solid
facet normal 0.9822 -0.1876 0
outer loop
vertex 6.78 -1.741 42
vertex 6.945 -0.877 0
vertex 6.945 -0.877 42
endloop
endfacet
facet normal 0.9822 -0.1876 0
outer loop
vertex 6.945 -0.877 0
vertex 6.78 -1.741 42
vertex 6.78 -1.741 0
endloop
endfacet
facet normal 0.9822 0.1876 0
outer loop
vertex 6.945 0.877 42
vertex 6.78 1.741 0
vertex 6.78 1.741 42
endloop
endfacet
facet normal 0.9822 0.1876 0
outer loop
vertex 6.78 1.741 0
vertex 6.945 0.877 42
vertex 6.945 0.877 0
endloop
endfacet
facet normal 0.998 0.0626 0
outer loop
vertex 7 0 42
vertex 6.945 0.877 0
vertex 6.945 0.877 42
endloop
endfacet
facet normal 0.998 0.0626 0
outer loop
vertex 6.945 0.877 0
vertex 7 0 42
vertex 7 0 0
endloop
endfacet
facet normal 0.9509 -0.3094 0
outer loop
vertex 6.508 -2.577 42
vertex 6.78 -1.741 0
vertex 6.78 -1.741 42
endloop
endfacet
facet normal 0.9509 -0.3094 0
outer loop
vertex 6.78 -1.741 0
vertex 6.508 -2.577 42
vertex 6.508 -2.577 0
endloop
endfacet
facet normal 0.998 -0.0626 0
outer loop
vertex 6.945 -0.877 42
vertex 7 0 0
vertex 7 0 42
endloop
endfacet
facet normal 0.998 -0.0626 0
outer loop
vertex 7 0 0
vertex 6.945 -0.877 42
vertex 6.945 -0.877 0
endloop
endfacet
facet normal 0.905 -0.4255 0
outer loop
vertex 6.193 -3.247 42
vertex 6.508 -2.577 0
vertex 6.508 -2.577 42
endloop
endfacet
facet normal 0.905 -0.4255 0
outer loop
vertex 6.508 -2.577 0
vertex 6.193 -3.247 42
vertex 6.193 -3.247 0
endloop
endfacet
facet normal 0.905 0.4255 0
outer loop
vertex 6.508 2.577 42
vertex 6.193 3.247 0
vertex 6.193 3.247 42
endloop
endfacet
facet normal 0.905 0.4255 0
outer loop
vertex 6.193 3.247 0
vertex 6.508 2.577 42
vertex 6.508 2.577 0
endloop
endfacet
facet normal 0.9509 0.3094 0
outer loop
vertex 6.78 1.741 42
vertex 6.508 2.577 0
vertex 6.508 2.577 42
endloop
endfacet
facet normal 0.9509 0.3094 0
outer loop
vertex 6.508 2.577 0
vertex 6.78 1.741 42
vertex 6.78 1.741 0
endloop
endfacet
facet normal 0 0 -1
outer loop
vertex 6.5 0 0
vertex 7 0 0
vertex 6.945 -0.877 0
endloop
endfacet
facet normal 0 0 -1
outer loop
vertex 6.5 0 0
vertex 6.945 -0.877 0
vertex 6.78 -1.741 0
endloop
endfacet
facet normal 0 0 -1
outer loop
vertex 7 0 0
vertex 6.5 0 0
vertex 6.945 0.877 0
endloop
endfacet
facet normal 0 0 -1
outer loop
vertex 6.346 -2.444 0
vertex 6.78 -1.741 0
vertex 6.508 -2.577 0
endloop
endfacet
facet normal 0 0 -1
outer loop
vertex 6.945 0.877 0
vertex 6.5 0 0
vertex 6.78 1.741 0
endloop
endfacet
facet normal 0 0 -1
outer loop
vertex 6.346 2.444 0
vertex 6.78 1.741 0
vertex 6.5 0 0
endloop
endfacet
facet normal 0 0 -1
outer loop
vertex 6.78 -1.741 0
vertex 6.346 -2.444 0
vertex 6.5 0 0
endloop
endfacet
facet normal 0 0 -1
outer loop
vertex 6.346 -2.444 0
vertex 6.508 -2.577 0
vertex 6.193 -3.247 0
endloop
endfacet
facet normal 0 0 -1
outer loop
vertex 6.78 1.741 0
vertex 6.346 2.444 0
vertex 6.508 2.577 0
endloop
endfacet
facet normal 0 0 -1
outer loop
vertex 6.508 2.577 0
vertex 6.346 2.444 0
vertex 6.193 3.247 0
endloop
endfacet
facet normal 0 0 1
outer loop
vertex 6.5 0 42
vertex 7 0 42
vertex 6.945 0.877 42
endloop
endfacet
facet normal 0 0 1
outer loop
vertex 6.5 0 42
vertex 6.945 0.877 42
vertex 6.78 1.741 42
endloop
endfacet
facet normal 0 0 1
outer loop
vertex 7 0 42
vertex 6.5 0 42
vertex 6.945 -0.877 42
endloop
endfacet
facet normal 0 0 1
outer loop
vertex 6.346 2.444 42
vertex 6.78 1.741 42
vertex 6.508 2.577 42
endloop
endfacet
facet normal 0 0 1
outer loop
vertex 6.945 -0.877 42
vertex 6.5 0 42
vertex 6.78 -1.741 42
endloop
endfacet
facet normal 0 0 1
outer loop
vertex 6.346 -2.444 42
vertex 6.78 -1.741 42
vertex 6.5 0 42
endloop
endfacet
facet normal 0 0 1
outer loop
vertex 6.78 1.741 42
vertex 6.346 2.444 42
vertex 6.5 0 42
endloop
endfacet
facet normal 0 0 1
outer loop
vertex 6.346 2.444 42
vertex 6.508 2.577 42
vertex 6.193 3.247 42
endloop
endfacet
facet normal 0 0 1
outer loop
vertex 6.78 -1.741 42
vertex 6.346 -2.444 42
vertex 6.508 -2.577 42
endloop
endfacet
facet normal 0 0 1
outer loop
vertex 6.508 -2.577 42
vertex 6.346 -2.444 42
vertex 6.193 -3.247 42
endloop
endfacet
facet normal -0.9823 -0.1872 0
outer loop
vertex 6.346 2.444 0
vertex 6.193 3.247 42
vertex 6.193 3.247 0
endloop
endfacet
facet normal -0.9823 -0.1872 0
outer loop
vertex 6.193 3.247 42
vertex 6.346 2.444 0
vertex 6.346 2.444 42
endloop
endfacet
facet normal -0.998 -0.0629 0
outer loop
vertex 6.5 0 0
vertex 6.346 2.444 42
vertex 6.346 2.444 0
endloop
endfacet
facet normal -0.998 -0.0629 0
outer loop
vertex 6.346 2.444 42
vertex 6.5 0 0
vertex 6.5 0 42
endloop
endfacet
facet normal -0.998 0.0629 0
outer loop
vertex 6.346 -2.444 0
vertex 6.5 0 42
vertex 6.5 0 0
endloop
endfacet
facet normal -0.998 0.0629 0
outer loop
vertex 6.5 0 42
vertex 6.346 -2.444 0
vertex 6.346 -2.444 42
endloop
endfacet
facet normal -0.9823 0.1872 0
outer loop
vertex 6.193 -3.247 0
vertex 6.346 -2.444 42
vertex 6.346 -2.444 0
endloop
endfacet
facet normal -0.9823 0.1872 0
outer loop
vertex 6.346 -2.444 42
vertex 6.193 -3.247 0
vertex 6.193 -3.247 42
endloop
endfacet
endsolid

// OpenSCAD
$fn = 50;


difference() {
	union() {
		cylinder(h = 42, r = 7.0000000000);
		translate(v = [-16.0000000000, 0, 0]) {
			cylinder(h = 42, r = 7.0000000000);
		}
	}
	union() {
		cylinder(h = 42, r = 3.2500000000);
		cylinder(h = 42, r = 1.8000000000);
		cylinder(h = 42, r = 1.8000000000);
		cylinder(h = 42, r = 1.8000000000);
		translate(v = [-20.5000000000, 0, 0]) {
			hull() {
				translate(v = [-3.7500000000, 0.0000000000, 0]) {
					cylinder(h = 42, r = 10.5000000000);
				}
				translate(v = [3.7500000000, 0.0000000000, 0]) {
					cylinder(h = 42, r = 10.5000000000);
				}
				translate(v = [-3.7500000000, -0.0000000000, 0]) {
					cylinder(h = 42, r = 10.5000000000);
				}
				translate(v = [3.7500000000, -0.0000000000, 0]) {
					cylinder(h = 42, r = 10.5000000000);
				}
			}
		}
		translate(v = [-13.0000000000, 0, 0.0000000000]) {
			cylinder(h = 42, r = 19.5000000000);
		}
	}
}
